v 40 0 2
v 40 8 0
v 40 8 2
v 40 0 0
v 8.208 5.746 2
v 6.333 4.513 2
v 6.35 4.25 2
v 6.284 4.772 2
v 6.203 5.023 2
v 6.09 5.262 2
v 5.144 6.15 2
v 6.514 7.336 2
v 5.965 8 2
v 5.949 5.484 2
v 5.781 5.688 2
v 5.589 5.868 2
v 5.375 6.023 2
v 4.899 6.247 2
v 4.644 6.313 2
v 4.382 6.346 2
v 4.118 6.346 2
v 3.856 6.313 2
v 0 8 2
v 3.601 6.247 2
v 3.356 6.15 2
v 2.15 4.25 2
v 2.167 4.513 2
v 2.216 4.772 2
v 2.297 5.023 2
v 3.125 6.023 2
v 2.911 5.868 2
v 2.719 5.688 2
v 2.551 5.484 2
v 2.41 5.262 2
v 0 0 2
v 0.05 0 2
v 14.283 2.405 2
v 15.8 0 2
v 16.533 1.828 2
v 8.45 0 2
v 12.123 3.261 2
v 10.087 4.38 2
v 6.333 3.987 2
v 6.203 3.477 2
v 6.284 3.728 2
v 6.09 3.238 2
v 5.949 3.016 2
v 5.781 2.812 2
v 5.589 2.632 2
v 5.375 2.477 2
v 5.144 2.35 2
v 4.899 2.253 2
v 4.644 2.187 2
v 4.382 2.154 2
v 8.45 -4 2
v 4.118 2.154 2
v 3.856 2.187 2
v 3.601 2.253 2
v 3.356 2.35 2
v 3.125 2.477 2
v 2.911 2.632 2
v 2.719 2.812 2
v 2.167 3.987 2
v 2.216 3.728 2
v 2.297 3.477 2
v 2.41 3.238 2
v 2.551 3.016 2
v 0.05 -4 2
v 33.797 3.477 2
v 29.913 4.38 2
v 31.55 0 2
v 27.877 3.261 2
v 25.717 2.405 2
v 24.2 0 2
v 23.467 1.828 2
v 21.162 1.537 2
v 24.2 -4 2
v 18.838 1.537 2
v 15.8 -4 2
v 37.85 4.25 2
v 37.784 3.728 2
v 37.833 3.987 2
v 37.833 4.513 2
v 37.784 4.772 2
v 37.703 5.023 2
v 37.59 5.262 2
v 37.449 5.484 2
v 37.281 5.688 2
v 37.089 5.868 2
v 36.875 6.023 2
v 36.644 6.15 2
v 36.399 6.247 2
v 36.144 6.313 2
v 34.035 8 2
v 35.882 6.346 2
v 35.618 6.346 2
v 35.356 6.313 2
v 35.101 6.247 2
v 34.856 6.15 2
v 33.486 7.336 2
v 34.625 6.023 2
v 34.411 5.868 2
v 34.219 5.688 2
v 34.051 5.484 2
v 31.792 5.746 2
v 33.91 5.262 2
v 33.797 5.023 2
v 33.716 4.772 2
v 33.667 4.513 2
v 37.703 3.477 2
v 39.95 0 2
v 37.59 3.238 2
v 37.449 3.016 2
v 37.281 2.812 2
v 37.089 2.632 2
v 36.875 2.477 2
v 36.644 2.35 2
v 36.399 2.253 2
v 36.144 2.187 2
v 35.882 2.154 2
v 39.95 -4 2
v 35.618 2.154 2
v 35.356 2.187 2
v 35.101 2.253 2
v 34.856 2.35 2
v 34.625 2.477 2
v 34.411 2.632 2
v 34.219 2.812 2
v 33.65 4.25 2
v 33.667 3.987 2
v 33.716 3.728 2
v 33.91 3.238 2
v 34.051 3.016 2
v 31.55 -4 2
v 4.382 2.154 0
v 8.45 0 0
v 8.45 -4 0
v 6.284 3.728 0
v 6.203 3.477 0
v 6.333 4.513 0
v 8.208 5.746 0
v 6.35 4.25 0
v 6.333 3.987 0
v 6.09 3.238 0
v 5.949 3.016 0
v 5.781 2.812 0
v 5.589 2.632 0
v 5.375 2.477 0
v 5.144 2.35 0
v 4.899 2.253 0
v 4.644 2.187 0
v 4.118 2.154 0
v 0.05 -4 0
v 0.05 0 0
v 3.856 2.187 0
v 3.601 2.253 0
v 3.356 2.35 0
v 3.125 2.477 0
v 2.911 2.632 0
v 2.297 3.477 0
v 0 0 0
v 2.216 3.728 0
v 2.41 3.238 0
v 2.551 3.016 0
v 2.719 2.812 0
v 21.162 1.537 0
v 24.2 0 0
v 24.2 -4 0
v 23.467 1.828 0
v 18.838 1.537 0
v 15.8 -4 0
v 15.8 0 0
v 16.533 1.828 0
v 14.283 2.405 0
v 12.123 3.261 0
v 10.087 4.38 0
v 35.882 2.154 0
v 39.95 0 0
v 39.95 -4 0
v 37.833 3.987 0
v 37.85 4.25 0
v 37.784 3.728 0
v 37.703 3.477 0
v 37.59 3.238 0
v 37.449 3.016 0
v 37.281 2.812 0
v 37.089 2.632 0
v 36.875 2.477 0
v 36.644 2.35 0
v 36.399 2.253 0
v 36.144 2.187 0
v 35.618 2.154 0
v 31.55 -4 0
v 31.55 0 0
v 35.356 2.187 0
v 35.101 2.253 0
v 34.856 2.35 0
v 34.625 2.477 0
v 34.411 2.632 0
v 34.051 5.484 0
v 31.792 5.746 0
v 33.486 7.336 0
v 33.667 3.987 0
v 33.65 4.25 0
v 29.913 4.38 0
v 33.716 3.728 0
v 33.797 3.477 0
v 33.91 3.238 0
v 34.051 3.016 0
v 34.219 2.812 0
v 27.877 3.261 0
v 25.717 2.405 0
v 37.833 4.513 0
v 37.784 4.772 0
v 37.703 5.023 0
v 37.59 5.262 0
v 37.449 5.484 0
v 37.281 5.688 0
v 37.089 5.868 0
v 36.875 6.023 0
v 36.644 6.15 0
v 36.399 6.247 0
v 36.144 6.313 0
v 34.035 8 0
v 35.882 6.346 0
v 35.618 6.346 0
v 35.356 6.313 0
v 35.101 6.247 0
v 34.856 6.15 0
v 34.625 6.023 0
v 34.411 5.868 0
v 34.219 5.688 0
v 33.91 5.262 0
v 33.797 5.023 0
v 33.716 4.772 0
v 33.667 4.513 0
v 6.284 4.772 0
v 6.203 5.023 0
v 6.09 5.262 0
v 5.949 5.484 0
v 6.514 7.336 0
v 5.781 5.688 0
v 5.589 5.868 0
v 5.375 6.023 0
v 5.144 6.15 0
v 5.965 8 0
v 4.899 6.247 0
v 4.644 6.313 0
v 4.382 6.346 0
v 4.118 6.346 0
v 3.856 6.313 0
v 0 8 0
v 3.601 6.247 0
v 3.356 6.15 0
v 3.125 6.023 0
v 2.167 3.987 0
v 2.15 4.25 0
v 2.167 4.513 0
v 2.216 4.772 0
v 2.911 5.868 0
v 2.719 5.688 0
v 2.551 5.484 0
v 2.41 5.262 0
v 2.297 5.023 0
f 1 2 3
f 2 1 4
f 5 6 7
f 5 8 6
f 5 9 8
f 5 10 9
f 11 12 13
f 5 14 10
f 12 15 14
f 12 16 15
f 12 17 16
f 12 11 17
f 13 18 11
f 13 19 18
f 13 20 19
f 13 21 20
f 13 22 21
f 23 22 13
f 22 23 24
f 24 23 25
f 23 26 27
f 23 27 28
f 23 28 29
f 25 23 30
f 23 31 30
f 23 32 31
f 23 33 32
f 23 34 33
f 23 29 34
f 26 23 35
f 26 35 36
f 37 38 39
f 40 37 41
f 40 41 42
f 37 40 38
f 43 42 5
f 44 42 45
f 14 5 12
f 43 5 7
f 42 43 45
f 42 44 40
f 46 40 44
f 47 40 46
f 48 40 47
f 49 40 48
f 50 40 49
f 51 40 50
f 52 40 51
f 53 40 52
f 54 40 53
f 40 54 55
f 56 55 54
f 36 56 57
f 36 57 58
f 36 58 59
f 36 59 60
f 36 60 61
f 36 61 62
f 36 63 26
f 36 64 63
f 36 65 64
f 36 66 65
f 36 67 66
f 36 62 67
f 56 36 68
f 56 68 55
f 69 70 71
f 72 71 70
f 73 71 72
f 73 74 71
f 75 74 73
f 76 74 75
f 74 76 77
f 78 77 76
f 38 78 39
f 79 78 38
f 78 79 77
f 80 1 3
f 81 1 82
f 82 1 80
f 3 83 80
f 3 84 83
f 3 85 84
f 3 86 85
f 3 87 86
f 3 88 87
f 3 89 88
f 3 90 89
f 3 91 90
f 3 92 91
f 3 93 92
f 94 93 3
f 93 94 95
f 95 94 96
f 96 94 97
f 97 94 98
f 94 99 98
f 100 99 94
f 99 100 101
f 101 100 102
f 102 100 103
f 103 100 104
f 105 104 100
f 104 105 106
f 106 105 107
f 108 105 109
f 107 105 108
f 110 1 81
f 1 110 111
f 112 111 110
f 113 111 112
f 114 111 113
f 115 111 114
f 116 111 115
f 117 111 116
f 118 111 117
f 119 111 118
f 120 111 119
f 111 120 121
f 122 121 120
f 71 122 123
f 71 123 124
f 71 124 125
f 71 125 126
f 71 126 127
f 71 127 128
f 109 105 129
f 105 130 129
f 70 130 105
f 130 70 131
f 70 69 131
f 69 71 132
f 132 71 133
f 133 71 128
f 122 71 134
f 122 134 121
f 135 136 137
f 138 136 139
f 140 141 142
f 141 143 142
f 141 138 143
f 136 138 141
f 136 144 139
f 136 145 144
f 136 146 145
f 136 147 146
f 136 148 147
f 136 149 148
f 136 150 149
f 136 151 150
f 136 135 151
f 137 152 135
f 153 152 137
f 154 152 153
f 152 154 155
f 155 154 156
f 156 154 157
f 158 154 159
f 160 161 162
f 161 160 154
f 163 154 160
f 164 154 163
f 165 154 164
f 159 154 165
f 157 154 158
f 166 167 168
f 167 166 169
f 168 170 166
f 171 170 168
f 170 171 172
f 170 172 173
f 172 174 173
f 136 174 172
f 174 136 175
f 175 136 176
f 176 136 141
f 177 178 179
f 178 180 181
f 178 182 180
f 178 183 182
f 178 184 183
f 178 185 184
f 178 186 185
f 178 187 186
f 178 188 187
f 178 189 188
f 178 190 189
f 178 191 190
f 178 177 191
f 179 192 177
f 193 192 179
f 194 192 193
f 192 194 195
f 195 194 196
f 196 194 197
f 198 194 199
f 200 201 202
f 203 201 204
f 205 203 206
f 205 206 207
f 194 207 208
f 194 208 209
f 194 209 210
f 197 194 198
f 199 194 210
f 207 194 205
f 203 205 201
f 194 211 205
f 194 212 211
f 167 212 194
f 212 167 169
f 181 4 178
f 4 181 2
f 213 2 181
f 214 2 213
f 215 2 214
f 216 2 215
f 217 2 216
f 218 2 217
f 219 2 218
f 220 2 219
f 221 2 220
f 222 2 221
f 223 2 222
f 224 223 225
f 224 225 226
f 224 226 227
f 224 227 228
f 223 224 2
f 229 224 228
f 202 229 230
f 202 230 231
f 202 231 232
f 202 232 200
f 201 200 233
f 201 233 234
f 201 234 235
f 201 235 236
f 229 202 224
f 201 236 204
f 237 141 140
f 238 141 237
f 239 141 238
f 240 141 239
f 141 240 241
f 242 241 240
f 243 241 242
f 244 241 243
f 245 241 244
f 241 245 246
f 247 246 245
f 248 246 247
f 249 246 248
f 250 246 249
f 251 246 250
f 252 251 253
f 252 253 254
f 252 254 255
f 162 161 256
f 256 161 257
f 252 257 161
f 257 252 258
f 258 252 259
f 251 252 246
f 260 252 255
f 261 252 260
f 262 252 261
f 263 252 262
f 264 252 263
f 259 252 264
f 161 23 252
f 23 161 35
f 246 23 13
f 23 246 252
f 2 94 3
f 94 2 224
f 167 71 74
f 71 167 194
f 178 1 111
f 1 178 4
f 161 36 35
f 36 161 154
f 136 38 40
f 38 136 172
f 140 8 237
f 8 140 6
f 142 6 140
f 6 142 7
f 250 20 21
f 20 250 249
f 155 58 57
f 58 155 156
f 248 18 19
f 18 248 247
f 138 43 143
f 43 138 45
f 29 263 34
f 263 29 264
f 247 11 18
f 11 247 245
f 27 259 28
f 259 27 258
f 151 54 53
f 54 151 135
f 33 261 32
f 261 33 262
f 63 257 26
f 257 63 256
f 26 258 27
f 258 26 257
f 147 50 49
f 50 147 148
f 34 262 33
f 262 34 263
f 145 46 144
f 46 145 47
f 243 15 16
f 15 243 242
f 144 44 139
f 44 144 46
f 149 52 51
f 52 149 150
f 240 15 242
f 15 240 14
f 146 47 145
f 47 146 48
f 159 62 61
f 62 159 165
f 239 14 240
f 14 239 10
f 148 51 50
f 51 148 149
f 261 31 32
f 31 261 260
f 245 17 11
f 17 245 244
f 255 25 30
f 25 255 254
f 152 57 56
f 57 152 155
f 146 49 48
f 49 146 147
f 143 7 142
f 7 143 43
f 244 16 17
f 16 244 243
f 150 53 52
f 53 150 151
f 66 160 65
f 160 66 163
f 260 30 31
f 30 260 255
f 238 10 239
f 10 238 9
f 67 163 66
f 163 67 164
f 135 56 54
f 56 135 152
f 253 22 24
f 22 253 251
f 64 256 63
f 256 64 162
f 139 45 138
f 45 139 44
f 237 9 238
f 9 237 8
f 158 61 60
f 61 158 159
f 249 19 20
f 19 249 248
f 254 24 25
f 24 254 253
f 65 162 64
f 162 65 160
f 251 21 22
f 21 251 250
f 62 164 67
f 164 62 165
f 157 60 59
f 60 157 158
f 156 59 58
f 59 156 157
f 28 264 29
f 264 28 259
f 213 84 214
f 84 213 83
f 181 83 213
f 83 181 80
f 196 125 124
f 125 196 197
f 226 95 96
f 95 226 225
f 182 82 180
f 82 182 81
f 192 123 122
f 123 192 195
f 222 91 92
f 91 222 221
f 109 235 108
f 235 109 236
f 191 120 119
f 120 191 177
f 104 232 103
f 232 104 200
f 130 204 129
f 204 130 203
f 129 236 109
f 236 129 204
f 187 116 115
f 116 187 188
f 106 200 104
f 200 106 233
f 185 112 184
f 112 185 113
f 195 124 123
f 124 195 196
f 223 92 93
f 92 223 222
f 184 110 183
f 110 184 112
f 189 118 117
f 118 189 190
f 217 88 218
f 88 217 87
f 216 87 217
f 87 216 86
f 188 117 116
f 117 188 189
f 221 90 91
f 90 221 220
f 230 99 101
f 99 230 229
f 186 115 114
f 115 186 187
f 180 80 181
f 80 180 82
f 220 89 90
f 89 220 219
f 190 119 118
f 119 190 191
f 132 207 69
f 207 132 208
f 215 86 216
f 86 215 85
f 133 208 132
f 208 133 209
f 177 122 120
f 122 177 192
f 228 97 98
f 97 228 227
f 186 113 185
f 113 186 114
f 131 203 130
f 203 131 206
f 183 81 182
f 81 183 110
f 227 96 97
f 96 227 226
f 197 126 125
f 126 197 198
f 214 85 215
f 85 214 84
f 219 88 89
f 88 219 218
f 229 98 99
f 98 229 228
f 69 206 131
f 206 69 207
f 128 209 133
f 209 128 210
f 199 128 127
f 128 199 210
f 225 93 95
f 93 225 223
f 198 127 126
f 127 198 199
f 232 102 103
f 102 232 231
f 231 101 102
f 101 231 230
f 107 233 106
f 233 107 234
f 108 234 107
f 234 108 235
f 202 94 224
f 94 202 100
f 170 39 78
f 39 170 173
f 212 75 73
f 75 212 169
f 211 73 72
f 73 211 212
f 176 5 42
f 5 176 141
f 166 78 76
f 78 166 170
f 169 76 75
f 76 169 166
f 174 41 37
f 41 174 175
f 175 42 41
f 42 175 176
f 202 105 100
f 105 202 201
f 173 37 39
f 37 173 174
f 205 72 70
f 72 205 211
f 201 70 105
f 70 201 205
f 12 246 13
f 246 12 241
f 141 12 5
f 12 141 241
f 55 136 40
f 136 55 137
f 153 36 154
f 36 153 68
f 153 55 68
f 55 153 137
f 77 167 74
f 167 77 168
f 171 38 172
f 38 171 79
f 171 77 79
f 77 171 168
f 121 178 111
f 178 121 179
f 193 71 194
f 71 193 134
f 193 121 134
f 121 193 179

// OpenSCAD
// Fan bracket for Small Brushless DC Fan
// Dimensions:
// H x W x D = 40 x 40 x 20.2mm
// Hole raster 31.5 x 31.5mm
// 
// For mounting on a flat surface using brackets on either side
// Two brackets must be printed
//
// Version 0.1

$fn=50;

W=40; // Width (equals height)
Drotor=37; // Fan in- outlet diameter 37mm
hole=4.2; // Mounting holes
grid=31.5; // Mounting hole grid
depth=20.5; // Fan depth

Hbr=8; //Bracket height
Tbr=2; //Bracket thickness
Hbp=2*Tbr; //Base plate height

//Shape to match fan dimensions
difference(){
cube ([W,Hbr,Tbr]);
translate(v=[(W/2)-(grid/2),(W/2)-(grid/2),0]){ cylinder(h=Tbr, d=hole); }
translate(v=[(W/2)+(grid/2),(W/2)-(grid/2),0]){ cylinder(h=Tbr, d=hole); }
translate(v=[(W/2), W/2,0]){ cylinder(h=Tbr, d=Drotor); }
}

//Slots to snap into base plate
translate(v=[(W/2)-(grid/2)-hole,-Hbp,0]){cube ([hole*2,Hbp,Tbr]);}
translate(v=[(W/2)-hole,-Hbp,0]){cube ([hole*2,Hbp,Tbr]);}
translate(v=[(W/2)+(grid/2)-hole,-Hbp,0]){cube ([hole*2,Hbp,Tbr]);}
